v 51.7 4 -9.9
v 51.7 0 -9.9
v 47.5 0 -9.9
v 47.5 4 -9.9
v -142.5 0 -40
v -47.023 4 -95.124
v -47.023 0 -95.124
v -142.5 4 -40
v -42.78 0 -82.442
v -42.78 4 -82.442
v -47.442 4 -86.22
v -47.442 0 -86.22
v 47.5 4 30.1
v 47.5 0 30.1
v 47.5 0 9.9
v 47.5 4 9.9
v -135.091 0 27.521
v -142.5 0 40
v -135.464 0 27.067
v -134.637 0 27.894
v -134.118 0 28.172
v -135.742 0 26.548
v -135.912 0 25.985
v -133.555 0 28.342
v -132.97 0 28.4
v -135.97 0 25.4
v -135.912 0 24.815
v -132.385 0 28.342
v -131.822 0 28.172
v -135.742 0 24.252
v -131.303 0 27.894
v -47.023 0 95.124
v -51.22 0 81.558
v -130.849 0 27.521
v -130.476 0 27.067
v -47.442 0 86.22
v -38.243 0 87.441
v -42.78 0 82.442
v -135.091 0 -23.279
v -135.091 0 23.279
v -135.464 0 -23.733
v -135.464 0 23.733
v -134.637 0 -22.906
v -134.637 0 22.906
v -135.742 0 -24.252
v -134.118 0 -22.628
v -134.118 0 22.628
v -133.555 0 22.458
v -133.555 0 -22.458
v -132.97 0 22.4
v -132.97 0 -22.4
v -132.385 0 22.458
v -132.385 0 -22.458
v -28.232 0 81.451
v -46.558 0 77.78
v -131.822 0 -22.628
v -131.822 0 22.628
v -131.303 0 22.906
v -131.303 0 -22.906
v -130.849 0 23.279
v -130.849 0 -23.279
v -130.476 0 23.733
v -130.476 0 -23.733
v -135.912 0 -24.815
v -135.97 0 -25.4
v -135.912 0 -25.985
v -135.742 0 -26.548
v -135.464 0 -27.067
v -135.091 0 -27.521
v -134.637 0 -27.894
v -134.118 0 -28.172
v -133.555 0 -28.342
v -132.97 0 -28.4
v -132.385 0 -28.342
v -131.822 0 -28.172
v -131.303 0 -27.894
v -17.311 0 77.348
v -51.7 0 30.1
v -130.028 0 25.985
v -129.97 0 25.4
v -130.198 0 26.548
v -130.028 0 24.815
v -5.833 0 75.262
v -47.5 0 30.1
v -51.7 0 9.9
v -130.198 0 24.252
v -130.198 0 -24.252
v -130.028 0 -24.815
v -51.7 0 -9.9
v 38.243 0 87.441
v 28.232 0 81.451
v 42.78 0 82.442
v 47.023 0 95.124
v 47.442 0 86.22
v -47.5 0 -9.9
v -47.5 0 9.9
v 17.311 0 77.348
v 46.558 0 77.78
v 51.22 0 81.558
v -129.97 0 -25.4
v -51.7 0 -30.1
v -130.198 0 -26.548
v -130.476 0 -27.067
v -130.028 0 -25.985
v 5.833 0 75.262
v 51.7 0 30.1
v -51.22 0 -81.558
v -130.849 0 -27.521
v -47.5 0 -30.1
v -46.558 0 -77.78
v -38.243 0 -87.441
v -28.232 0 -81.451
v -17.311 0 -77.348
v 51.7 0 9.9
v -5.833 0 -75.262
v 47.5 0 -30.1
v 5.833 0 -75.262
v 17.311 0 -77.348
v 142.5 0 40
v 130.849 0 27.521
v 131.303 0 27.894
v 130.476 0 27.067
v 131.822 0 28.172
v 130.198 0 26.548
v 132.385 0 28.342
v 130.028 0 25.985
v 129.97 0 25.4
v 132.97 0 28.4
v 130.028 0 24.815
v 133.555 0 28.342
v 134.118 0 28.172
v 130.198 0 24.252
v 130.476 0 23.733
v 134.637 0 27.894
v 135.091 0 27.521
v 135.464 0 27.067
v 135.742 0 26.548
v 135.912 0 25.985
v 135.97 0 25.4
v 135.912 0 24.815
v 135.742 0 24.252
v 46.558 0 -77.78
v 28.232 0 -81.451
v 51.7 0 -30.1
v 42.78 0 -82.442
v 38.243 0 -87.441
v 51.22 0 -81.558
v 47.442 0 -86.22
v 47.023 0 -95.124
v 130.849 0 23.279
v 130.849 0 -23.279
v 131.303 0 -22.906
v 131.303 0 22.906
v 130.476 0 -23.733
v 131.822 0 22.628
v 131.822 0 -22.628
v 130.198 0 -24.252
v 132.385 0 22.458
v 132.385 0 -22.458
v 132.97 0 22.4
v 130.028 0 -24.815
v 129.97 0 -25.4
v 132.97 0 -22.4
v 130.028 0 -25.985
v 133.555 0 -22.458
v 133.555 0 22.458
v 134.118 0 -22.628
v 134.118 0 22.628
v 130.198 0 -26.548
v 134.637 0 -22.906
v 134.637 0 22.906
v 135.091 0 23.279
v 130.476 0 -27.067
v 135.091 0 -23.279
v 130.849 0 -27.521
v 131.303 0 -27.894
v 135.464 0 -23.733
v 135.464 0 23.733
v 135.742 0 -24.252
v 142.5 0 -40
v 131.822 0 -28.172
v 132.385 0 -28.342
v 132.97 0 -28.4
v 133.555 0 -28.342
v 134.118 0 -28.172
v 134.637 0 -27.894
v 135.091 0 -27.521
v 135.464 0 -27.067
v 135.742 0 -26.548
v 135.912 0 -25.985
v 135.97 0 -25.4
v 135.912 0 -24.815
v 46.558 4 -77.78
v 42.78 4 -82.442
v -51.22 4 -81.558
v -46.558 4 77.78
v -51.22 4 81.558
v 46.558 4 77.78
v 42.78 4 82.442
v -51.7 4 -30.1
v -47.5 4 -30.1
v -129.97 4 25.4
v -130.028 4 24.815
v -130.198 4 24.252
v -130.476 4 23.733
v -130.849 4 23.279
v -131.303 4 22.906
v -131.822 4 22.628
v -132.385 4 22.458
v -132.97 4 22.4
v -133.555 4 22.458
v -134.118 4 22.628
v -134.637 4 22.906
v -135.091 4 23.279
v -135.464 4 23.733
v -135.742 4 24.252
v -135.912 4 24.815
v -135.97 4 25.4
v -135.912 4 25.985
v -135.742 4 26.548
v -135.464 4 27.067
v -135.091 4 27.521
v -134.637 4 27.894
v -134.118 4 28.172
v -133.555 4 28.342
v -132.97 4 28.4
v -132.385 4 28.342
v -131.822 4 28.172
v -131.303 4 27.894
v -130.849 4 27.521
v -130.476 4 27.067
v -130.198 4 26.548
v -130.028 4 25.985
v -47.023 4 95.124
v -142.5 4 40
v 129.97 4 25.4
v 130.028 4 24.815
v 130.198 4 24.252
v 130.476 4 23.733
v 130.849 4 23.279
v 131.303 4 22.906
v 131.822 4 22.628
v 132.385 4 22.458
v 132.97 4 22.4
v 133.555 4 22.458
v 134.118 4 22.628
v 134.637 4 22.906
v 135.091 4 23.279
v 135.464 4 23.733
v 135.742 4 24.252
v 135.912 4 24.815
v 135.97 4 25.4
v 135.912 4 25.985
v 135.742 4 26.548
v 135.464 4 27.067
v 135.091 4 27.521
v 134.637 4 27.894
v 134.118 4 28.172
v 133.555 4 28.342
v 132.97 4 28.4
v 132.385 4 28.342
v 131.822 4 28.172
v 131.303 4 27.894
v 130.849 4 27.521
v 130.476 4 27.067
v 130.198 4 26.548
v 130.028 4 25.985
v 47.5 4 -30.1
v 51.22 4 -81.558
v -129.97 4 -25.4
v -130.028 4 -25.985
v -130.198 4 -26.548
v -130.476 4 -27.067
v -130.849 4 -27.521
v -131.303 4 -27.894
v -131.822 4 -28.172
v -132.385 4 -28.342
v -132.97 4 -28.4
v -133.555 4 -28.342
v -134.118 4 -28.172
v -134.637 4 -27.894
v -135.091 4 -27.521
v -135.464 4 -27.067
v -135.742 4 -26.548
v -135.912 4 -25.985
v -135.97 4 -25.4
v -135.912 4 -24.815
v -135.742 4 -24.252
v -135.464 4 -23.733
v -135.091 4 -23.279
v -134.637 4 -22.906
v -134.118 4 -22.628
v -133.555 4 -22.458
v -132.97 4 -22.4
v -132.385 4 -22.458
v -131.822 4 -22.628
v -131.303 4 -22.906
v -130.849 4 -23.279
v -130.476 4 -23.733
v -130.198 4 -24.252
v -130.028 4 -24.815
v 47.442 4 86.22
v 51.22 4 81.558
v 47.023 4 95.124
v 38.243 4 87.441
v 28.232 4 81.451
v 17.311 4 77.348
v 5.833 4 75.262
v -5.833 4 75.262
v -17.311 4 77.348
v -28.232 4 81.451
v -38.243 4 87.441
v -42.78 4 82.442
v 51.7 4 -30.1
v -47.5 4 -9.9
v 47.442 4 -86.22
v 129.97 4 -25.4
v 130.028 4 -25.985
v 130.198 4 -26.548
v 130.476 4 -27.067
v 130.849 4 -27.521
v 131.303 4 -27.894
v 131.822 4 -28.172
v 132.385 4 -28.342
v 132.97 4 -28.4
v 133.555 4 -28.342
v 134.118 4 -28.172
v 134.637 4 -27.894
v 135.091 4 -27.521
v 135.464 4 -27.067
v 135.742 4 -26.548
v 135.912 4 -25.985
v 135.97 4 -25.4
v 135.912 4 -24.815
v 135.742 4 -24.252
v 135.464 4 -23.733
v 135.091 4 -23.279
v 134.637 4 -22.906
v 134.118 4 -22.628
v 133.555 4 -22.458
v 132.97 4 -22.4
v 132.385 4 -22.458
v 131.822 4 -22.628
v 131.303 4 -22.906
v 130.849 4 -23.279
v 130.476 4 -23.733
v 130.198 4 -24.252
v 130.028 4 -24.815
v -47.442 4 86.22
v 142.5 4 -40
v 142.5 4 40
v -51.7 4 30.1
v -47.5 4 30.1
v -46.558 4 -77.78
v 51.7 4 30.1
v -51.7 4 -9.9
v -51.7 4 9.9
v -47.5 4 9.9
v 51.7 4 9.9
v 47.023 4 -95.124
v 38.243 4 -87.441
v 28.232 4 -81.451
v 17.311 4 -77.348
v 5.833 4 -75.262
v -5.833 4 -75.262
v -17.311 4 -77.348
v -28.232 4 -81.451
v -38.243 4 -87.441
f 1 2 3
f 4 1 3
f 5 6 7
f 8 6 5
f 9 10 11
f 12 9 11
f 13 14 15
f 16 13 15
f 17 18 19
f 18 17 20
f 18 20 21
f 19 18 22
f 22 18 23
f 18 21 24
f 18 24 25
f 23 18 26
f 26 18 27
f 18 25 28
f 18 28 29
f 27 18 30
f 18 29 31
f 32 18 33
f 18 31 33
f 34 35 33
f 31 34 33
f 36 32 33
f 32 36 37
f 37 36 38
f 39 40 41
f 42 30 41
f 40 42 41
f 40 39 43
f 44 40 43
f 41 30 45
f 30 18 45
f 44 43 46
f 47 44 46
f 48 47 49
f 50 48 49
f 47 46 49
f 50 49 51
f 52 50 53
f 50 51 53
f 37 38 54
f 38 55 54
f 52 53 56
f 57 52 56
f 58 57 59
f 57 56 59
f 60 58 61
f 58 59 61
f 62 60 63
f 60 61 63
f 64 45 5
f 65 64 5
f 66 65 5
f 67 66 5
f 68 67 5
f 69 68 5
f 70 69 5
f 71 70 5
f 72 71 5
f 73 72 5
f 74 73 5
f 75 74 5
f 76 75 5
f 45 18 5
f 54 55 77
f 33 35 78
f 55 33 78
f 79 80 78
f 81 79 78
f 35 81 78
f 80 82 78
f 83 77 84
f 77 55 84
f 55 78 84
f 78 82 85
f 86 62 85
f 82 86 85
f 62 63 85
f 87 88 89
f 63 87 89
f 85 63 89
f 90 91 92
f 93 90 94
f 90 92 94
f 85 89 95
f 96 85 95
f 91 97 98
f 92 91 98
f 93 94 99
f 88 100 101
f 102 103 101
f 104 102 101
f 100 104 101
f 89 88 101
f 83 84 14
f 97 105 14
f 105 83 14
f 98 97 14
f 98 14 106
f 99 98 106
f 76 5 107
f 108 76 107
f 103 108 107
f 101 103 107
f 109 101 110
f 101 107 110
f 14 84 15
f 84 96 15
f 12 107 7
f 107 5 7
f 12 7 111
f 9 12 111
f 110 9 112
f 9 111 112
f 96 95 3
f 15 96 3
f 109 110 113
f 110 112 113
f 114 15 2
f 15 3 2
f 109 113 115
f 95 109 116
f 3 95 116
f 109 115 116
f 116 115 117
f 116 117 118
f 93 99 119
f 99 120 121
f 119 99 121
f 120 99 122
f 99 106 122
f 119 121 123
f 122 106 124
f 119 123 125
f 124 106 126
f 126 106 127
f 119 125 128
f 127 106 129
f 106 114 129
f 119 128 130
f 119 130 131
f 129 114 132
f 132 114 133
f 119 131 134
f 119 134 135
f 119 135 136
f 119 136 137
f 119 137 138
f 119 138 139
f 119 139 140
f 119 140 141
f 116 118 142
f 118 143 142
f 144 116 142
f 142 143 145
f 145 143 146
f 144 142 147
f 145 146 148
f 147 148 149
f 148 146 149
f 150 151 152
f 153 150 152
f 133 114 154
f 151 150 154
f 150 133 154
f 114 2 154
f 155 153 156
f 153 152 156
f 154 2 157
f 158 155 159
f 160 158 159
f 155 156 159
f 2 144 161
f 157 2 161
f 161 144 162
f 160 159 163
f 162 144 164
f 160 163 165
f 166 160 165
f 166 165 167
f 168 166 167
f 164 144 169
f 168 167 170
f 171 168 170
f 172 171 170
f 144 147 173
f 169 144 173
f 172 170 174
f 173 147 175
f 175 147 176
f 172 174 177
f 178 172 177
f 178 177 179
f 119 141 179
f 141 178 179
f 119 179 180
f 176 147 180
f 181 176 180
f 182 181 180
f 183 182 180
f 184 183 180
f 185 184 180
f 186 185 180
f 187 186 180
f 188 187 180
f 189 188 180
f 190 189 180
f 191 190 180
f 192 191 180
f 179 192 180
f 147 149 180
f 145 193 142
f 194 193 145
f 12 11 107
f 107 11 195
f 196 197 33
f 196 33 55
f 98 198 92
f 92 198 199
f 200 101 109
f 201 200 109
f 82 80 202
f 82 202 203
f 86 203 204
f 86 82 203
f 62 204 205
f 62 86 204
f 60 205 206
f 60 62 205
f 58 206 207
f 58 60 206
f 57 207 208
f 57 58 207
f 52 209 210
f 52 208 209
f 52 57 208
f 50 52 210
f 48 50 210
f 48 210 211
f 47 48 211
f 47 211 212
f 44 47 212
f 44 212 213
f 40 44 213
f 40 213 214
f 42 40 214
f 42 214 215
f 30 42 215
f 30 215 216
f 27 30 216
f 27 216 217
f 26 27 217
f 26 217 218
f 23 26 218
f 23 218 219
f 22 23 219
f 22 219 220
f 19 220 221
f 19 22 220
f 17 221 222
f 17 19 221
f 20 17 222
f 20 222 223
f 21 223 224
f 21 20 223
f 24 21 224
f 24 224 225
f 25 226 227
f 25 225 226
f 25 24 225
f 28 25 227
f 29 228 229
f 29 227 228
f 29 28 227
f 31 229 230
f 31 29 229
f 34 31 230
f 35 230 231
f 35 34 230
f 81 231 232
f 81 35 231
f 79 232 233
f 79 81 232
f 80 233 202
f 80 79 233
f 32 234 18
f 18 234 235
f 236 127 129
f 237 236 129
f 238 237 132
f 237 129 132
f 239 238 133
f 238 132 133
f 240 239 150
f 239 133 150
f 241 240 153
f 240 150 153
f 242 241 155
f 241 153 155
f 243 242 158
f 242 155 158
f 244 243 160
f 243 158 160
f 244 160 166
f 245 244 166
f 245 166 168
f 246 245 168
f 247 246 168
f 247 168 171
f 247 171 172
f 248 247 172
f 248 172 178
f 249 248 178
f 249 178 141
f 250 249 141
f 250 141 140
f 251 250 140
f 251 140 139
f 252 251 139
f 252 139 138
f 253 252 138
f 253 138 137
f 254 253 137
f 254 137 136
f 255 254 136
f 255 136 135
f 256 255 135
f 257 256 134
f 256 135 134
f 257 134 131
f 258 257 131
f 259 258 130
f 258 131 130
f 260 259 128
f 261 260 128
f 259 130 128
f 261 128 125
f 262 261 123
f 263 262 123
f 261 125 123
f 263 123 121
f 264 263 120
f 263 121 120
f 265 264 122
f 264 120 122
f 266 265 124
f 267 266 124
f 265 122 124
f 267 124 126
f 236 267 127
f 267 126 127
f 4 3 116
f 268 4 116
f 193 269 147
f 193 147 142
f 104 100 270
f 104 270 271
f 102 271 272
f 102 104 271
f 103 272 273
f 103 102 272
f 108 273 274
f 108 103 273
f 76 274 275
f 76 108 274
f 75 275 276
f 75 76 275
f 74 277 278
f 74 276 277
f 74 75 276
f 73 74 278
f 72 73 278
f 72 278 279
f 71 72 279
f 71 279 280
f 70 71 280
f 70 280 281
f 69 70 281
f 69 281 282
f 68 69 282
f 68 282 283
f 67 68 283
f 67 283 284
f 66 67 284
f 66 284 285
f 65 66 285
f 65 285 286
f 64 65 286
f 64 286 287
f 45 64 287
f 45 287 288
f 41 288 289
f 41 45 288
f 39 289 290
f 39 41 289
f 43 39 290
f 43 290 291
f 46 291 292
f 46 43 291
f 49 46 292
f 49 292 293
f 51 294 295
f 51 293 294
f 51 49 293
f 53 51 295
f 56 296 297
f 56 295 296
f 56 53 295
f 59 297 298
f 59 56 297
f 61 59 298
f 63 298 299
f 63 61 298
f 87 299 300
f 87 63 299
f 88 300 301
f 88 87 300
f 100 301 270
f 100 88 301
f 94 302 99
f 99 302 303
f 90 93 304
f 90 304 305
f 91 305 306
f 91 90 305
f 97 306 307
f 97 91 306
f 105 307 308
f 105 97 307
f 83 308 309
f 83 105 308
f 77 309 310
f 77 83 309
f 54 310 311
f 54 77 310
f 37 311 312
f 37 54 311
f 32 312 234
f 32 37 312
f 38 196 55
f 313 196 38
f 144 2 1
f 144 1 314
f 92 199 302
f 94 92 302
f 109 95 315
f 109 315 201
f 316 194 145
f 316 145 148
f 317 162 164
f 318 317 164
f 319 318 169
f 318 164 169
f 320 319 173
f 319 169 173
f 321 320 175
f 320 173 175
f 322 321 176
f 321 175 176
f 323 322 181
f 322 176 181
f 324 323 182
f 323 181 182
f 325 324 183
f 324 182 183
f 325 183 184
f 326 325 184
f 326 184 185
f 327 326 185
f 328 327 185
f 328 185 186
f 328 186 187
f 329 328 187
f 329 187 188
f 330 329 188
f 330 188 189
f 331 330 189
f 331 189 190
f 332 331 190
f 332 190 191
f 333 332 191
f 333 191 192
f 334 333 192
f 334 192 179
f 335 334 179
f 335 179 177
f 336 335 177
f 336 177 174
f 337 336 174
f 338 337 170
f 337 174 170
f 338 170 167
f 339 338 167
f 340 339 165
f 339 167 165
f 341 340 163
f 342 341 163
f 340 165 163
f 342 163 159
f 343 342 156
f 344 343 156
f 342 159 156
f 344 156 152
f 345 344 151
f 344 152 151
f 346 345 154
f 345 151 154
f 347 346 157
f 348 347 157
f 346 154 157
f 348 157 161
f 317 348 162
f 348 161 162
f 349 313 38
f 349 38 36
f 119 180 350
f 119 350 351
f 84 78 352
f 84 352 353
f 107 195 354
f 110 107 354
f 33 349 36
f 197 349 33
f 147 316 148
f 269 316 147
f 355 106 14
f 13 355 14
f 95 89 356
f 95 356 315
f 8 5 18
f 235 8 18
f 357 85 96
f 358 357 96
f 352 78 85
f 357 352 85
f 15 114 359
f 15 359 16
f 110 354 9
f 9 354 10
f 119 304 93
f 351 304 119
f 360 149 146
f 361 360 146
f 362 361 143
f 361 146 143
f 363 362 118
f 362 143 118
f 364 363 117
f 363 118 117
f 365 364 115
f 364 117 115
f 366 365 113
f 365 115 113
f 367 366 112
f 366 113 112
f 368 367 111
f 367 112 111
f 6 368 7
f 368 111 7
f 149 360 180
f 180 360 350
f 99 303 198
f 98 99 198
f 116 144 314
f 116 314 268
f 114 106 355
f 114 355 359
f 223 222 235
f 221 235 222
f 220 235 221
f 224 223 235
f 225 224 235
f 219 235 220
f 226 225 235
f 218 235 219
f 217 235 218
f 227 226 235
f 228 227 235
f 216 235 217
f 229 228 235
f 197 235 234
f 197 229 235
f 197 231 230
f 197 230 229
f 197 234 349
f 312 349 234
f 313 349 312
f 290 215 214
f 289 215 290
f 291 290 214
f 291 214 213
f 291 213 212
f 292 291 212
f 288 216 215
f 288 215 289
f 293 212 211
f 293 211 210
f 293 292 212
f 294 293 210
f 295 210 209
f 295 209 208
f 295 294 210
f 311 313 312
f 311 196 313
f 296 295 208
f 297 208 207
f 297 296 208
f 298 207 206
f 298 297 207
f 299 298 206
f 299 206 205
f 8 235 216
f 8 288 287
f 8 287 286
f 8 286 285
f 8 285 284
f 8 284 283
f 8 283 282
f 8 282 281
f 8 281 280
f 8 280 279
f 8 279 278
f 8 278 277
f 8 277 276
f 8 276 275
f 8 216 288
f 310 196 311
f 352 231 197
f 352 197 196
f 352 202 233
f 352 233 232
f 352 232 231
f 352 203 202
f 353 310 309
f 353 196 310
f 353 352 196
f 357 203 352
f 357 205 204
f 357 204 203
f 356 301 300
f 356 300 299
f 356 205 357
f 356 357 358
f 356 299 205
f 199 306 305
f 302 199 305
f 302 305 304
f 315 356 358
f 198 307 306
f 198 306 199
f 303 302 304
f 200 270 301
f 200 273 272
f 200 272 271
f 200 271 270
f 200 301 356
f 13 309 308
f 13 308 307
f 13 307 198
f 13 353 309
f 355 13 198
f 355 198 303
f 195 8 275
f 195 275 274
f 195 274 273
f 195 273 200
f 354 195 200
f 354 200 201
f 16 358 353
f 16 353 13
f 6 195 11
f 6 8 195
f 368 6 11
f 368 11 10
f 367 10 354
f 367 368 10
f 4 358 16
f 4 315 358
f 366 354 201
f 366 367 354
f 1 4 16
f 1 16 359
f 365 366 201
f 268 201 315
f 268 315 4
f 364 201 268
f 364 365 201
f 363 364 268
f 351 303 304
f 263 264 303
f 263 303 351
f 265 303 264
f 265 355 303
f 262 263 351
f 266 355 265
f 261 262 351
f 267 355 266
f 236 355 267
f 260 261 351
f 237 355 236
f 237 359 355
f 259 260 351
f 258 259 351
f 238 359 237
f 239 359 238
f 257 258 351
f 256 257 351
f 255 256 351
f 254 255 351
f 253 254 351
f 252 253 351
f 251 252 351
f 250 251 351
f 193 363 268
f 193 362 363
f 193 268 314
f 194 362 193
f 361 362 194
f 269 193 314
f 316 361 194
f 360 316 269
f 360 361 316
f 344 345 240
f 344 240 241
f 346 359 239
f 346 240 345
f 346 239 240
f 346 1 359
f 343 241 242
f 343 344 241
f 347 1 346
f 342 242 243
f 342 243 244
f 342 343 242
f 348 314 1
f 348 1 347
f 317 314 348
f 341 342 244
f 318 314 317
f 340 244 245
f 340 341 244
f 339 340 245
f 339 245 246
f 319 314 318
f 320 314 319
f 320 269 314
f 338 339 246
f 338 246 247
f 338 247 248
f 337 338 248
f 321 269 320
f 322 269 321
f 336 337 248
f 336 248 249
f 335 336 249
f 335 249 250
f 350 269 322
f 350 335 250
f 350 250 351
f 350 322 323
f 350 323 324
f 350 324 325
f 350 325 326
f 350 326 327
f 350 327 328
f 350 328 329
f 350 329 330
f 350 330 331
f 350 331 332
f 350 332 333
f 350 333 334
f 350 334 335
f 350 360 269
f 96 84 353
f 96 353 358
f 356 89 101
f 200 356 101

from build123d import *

# Parameters (mm, degrees)
ESQUISSE1_R             = 197.5
BOSS_EXTRU_1_DEPTH      = 4
ENL_V_START             = -1
ESQUISSE3_R             = 3
ENL_V_MAT_EXTRU_2_DEPTH = 6
ENL_V_MAT_EXTRU_5_DEPTH = 5
ESQUISSE6_W             = 4.2
ESQUISSE6_H             = 20.2
ENL_V_MAT_EXTRU_8_DEPTH = 5
ENL_V_MAT_EXTRU_6_DEPTH = 5
CUT_EXTRUDE1_DEPTH      = 5
MIRROR5_COPY_1_DEPTH    = 5
CUT_EXTRUDE2_DEPTH      = 5
MIRROR7_COPY_1_DEPTH    = 5


with BuildPart() as part:
    # Esquisse1 → Boss.-Extru.1 (new body)
    with BuildSketch(Plane(origin=(0, 0, 0), x_dir=(1, 0, 0), z_dir=(0, 1, 0))):
        Circle(ESQUISSE1_R)
    extrude(amount=BOSS_EXTRU_1_DEPTH)

    # Esquisse3 → Enlèv. mat.-Extru.2 (cut)
    with BuildSketch(Plane(origin=(0, 0, 0), x_dir=(1, 0, 0), z_dir=(0, 1, 0)).offset(ENL_V_START)):
        with Locations((-132.97, 25.4)):
            Circle(ESQUISSE3_R)
        with Locations((-132.97, -25.4)):
            Circle(ESQUISSE3_R)
        with BuildLine():
            Line((-180.572007797, 80), (-157.5, 80))
            ThreePointArc((-157.5, 80), (-146.893398282, 75.606601718), (-142.5, 65))
            Line((-142.5, 65), (-142.5, -65))
            ThreePointArc((-142.5, -65), (-146.893398282, -75.606601718), (-157.5, -80))
            Line((-157.5, -80), (-180.572007797, -80))
            ThreePointArc((-180.572007797, -80), (-197.5, 0), (-180.572007797, 80))
        make_face()
    enl_v_mat_extru_2 = extrude(amount=ENL_V_MAT_EXTRU_2_DEPTH, mode=Mode.SUBTRACT)

    # Esquisse4 → Enlèv. mat.-Extru.5 (cut, through all)
    with BuildSketch(Plane(origin=(0, 0, 0), x_dir=(1, 0, 0), z_dir=(0, 1, 0))):
        with BuildLine():
            Line((-107.5, 110), (-107.5, 90))
            ThreePointArc((-107.5, 90), (-104.571067812, 82.928932188), (-97.5, 80))
            Line((-97.5, 80), (-82.5, 80))
            ThreePointArc((-82.5, 80), (-75.428932188, 82.928932188), (-72.5, 90))
            Line((-72.5, 90), (-72.5, 110))
            ThreePointArc((-72.5, 110), (-75.428932188, 117.071067812), (-82.5, 120))
            Line((-82.5, 120), (-97.5, 120))
            ThreePointArc((-97.5, 120), (-104.571067812, 117.071067812), (-107.5, 110))
        make_face()
    enl_v_mat_extru_5 = extrude(amount=ENL_V_MAT_EXTRU_5_DEPTH, mode=Mode.SUBTRACT)

    # Esquisse6 → Enlèv. mat.-Extru.8 (cut, through all)
    with BuildSketch(Plane(origin=(0, 0, 0), x_dir=(1, 0, 0), z_dir=(0, 1, 0))):
        with Locations((-49.6, 20)):
            Rectangle(ESQUISSE6_W, ESQUISSE6_H)
        with Locations((-49.6, -20)):
            Rectangle(ESQUISSE6_W, ESQUISSE6_H)
    enl_v_mat_extru_8 = extrude(amount=ENL_V_MAT_EXTRU_8_DEPTH, mode=Mode.SUBTRACT)

    # Mirror1: Enlèv. mat.-Extru.2, Enlèv. mat.-Extru.5, Enlèv. mat.-Extru.8 across plane
    add(enl_v_mat_extru_2.mirror(Plane(origin=(0, 0, 0), x_dir=(0, 0, 1), z_dir=(1, 0, 0))), mode=Mode.SUBTRACT)
    add(enl_v_mat_extru_5.mirror(Plane(origin=(0, 0, 0), x_dir=(0, 0, 1), z_dir=(1, 0, 0))), mode=Mode.SUBTRACT)
    add(enl_v_mat_extru_8.mirror(Plane(origin=(0, 0, 0), x_dir=(0, 0, 1), z_dir=(1, 0, 0))), mode=Mode.SUBTRACT)

    # Esquisse5 → Enlèv. mat.-Extru.6 (cut, through all)
    with BuildSketch(Plane(origin=(0, 0, 0), x_dir=(1, 0, 0), z_dir=(0, 1, 0))):
        with BuildLine():
            Line((-65, 140), (-65, 186.497319016))
            ThreePointArc((-65, 186.497319016), (0, 197.5), (65, 186.497319016))
            Line((65, 186.497319016), (65, 140))
            ThreePointArc((65, 140), (0, 75), (-65, 140))
        make_face()
    enl_v_mat_extru_6 = extrude(amount=ENL_V_MAT_EXTRU_6_DEPTH, mode=Mode.SUBTRACT)

    # Mirror2: Enlèv. mat.-Extru.6 across plane
    add(enl_v_mat_extru_6.mirror(Plane.XY), mode=Mode.SUBTRACT)

    # Sketch1 → Cut-Extrude1 (cut, through all)
    with BuildSketch(Plane(origin=(0, 4, 0), x_dir=(1, 0, 0), z_dir=(0, 1, 0))):
        Polygon((-47.442047988, -86.219548978), (-51.219548978, -81.557952012), (-46.557952012, -77.780451022), (-42.780451022, -82.442047988), align=None)
    cut_extrude1 = extrude(amount=-CUT_EXTRUDE1_DEPTH, mode=Mode.SUBTRACT)

    # Mirror4: Cut-Extrude1 across plane
    add(cut_extrude1.mirror(Plane.XY), mode=Mode.SUBTRACT)

    # Mirror5: Cut-Extrude1 across plane
    add(cut_extrude1.mirror(Plane(origin=(0, 0, 0), x_dir=(0, 0, 1), z_dir=(1, 0, 0))), mode=Mode.SUBTRACT)

    # Mirror5 copy 1 sketch → Mirror5 copy 1 (cut, through all)
    with BuildSketch(Plane(origin=(0, 4, 0), x_dir=(-1, 0, 0), z_dir=(0, 1, 0))):
        Polygon((-47.442047988, -86.219548978), (-51.219548978, -81.557952012), (-46.557952012, -77.780451022), (-42.780451022, -82.442047988), align=None)
    extrude(amount=-MIRROR5_COPY_1_DEPTH, mode=Mode.SUBTRACT)

    # Sketch3 → Cut-Extrude2 (cut, through all)
    with BuildSketch(Plane(origin=(0, 4, 0), x_dir=(1, 0, 0), z_dir=(0, 1, 0))):
        Polygon((-47.022675211, 95.123859168), (-142.5, 40), (-180.572007797, 80), (-180.572007797, 186.497319016), (-65, 186.497319016), align=None)
    cut_extrude2 = extrude(amount=-CUT_EXTRUDE2_DEPTH, mode=Mode.SUBTRACT)

    # Mirror6: Cut-Extrude2 across plane
    add(cut_extrude2.mirror(Plane.XY), mode=Mode.SUBTRACT)

    # Mirror7: Cut-Extrude2 across plane
    add(cut_extrude2.mirror(Plane(origin=(0, 0, 0), x_dir=(0, 0, 1), z_dir=(1, 0, 0))), mode=Mode.SUBTRACT)

    # Mirror7 copy 1 sketch → Mirror7 copy 1 (cut, through all)
    with BuildSketch(Plane(origin=(0, 4, 0), x_dir=(-1, 0, 0), z_dir=(0, 1, 0))):
        Polygon((-47.022675211, 95.123859168), (-142.5, 40), (-180.572007797, 80), (-180.572007797, 186.497319016), (-65, 186.497319016), align=None)
    extrude(amount=-MIRROR7_COPY_1_DEPTH, mode=Mode.SUBTRACT)


solid = part.part
